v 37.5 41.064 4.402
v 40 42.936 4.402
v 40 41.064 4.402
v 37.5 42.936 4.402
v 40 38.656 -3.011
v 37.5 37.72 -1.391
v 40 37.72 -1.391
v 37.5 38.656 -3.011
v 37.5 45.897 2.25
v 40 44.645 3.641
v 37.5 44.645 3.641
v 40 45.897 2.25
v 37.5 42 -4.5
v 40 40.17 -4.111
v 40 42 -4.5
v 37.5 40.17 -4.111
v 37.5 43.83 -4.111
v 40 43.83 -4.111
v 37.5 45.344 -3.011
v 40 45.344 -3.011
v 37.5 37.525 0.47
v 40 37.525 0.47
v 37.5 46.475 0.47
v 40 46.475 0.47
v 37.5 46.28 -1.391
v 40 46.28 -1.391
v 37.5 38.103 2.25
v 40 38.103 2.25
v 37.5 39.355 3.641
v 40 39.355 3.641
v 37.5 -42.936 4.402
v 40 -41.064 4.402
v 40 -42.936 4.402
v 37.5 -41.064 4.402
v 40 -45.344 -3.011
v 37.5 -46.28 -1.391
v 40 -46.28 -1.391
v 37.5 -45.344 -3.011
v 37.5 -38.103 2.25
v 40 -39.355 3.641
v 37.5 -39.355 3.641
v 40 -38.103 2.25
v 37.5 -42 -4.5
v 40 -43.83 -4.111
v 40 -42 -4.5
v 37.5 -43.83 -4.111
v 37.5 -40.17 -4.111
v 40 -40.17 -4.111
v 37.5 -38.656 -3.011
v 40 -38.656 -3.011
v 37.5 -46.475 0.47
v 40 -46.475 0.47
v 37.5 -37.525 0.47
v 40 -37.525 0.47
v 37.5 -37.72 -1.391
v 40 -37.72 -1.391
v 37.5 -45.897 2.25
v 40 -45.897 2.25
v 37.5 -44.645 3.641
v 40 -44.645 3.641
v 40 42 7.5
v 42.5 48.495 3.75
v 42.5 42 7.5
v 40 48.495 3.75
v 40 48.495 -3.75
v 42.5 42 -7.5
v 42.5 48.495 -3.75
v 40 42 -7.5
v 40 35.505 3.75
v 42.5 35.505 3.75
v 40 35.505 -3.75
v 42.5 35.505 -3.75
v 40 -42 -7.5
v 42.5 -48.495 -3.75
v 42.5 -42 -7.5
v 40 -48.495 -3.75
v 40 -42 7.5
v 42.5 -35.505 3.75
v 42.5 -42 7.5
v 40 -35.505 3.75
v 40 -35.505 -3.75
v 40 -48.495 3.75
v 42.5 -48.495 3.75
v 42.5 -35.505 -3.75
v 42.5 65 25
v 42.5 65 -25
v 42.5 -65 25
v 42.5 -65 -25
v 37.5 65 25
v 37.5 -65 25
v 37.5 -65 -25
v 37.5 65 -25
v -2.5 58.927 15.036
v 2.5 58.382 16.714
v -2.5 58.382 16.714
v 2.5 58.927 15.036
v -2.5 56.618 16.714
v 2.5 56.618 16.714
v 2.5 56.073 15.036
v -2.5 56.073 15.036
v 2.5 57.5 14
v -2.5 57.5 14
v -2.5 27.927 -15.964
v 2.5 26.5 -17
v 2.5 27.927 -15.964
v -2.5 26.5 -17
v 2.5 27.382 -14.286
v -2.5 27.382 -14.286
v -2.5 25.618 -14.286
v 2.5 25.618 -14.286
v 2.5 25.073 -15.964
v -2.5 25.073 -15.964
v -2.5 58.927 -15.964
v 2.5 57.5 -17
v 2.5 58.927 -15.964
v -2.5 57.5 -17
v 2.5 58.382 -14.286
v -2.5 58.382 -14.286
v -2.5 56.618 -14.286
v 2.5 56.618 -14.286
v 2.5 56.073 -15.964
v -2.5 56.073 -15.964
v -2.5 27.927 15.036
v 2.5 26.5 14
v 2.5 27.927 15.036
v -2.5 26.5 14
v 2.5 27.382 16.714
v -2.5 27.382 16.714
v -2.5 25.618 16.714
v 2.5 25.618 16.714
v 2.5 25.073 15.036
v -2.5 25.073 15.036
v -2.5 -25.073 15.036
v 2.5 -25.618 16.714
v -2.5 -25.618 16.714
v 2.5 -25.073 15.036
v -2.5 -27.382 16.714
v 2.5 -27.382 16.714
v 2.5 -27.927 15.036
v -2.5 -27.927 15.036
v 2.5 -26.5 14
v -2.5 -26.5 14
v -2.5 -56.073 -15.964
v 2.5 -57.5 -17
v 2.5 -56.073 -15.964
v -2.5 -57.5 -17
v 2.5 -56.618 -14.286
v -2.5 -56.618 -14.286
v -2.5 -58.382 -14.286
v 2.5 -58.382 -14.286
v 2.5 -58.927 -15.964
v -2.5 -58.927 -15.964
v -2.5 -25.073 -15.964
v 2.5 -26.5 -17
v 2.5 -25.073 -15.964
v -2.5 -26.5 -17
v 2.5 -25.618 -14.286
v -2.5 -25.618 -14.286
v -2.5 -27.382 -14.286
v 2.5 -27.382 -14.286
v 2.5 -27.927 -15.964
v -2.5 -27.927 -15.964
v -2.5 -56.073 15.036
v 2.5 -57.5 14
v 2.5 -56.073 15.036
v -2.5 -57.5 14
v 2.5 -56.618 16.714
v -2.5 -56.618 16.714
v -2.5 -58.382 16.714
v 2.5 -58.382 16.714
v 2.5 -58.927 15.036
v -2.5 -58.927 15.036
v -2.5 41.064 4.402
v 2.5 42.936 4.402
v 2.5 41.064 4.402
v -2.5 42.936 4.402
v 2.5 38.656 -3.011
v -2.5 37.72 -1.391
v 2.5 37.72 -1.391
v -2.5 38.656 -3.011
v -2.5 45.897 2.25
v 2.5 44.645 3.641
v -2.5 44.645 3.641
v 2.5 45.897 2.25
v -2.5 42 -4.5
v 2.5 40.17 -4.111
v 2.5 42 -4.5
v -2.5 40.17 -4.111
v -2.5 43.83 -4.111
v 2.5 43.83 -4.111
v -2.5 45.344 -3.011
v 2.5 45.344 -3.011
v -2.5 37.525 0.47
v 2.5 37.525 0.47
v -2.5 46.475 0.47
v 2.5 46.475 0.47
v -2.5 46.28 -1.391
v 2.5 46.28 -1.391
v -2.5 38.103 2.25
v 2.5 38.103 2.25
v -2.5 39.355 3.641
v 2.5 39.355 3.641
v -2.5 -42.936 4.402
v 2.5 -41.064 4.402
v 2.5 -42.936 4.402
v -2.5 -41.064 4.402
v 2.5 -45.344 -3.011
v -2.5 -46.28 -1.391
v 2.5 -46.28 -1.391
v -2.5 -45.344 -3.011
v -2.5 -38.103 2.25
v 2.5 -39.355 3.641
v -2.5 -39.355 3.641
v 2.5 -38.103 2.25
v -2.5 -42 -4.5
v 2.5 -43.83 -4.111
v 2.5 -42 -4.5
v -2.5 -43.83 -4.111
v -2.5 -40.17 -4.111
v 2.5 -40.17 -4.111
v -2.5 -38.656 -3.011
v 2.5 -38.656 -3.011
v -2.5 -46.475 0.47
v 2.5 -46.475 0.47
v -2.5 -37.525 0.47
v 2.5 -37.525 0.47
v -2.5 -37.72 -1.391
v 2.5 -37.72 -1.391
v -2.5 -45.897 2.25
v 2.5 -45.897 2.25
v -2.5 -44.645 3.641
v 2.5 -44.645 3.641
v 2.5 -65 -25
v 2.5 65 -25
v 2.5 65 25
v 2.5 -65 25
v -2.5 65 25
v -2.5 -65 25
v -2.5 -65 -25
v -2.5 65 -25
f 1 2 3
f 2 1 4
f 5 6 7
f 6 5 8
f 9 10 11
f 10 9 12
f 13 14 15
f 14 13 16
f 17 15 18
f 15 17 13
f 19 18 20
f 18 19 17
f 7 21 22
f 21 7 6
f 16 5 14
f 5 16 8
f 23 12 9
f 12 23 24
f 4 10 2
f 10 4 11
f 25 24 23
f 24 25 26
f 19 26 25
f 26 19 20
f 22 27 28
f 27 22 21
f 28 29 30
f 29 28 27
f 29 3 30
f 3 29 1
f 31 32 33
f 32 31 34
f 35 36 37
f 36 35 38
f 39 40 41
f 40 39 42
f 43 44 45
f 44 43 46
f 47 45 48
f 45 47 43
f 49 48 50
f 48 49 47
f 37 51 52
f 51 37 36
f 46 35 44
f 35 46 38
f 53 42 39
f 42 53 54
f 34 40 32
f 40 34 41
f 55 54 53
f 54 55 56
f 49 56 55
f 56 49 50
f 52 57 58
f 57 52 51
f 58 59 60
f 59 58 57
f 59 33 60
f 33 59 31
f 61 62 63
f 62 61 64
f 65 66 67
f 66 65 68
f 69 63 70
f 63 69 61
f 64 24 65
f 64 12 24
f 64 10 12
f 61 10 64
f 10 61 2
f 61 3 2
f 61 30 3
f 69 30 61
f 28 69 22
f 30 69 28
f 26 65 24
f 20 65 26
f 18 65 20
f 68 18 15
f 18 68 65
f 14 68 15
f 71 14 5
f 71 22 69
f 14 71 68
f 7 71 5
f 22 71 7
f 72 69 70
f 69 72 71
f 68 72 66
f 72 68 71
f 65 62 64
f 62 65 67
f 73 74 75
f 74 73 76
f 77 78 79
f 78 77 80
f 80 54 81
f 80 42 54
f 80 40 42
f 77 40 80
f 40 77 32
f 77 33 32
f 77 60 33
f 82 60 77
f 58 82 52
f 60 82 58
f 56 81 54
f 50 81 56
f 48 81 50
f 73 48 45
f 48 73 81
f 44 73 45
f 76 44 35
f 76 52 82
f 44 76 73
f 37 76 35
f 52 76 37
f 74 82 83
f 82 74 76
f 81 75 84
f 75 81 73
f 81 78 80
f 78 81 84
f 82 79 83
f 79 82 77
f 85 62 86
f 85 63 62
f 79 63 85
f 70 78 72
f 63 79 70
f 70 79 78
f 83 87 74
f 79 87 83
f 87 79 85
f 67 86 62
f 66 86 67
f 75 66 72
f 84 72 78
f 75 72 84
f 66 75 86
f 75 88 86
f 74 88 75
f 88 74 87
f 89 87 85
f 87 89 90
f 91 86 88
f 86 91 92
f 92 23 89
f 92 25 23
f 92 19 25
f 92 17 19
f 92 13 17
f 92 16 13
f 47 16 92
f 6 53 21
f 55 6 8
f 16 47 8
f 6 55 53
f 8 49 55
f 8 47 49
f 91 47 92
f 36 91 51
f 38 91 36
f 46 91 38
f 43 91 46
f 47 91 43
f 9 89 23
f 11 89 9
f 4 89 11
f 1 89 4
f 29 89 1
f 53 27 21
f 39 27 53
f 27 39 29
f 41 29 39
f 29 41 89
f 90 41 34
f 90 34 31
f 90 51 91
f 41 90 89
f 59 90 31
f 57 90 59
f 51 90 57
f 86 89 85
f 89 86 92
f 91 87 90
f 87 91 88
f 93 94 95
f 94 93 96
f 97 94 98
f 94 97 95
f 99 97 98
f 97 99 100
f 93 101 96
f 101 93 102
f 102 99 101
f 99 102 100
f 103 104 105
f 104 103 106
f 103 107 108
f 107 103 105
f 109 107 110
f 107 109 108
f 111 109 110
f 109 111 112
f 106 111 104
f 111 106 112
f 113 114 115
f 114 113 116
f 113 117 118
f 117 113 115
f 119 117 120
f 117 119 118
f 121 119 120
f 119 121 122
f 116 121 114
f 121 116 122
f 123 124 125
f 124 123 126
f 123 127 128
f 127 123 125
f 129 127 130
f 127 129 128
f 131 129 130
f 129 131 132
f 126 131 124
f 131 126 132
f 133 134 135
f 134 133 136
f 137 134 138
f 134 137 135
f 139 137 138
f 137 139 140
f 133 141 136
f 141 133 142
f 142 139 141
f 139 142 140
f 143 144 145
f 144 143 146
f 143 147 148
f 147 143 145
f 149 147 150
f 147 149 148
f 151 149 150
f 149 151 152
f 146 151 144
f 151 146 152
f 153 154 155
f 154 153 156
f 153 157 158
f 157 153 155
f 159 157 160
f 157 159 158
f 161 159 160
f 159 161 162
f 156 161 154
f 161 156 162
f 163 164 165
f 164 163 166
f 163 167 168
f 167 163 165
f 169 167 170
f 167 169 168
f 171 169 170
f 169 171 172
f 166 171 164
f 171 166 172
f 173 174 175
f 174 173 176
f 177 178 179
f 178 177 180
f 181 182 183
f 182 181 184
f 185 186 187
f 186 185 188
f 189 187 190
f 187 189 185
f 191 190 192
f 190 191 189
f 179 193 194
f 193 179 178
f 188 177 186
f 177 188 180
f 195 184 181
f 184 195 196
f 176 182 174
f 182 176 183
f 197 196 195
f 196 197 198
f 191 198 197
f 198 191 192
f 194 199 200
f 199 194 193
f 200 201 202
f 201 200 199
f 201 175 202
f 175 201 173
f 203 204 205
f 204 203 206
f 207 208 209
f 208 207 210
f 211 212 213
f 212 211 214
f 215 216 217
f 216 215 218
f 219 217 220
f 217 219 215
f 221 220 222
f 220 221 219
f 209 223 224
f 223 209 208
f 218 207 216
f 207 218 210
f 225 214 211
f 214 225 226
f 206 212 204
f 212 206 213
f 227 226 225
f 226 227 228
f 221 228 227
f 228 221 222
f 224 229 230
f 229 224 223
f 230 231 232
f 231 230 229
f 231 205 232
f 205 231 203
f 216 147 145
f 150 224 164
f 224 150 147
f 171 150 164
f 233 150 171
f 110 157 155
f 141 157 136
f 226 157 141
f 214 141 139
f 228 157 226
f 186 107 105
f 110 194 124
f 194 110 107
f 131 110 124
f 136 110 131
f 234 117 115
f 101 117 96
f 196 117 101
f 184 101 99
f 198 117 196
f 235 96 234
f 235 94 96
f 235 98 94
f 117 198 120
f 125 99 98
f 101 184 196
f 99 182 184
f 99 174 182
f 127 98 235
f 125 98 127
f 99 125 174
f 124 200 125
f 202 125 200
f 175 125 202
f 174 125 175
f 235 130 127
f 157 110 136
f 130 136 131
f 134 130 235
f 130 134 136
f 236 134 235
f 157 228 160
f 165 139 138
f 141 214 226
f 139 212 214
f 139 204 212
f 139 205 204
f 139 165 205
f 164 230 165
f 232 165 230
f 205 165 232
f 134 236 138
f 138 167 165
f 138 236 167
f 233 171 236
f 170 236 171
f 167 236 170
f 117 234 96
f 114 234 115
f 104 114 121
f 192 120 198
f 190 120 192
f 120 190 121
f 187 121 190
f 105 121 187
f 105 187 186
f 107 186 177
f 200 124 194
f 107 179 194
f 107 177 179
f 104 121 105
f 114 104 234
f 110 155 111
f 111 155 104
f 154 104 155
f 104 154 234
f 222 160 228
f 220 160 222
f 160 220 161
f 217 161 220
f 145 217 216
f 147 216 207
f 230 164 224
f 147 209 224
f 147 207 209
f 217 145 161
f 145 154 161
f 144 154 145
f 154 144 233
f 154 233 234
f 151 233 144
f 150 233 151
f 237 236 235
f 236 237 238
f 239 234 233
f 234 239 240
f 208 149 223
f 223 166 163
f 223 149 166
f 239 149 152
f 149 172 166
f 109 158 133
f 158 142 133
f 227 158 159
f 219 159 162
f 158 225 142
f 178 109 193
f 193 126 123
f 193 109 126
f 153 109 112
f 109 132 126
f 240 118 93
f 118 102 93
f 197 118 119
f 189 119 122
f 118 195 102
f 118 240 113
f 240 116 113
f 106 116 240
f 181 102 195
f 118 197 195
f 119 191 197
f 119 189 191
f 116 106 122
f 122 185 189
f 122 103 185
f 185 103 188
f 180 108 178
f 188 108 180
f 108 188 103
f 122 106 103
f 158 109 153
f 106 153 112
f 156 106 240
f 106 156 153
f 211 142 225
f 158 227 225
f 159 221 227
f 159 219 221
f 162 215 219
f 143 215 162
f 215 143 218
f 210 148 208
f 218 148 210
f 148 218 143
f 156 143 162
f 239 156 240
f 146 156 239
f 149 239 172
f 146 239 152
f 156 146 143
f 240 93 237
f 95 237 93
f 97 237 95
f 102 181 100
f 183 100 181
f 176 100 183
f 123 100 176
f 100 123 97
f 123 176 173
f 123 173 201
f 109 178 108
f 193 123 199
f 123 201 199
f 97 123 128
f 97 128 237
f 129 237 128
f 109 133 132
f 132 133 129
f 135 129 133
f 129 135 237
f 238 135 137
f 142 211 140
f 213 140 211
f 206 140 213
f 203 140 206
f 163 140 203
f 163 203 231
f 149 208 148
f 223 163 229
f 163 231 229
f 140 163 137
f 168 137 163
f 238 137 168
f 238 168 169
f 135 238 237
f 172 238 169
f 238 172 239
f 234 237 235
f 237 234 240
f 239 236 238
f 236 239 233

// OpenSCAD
wall_thickness		= 5;
nut_size					= 15;
rod_diamiter			= 9;
screw_spacing		= 31;
motor_distance		= 84;
wall_width				= 130;
wall_height			= 50;
sides_on_nut			= 6;
screw_diamiter		= 3;


translate([40,0,0]) wall_one();
wall_two();

//color([0.75,0.75,0.75]) motor_dont_render();

module wall_one(){
	difference(){
		wall_one_added();
		wall_one_taken();
	}
}


module wall_one_added(){
		cube([wall_thickness,wall_width,wall_height],center=true);
}
	
module wall_one_taken(){
		rotate([0,90,0]) translate([0,motor_distance/2,-20]) cylinder(h=50, d=rod_diamiter, center=true);
		rotate([0,90,0]) translate([0,-motor_distance/2,-20]) cylinder(h=50, d=rod_diamiter, center=true);
		rotate([0,90,0]) translate([0,motor_distance/2,10/2]) cylinder(h=10, d=nut_size, center=true, $fn=sides_on_nut);
		rotate([0,90,0]) translate([0,-motor_distance/2,10/2]) cylinder(h=10, d=nut_size, center=true, $fn=sides_on_nut);
}

module wall_two(){
	difference(){
		wall_two_added();
		wall_two_taken();
	}
}


module wall_two_added(){
		cube([wall_thickness,wall_width,wall_height],center=true);
}
	
module wall_two_taken(){
		rotate([0,90,0]) translate([0,motor_distance/2,0]) cylinder(h=20, d=rod_diamiter, center=true);
		rotate([0,90,0]) translate([0,-motor_distance/2,0]) cylinder(h=20, d=rod_diamiter, center=true);
		translate([0,motor_distance/2,0]) motor();
		translate([0,-motor_distance/2,0]) motor();
}

module motor(){
	translate([0,screw_spacing/2,screw_spacing/2]) rotate([0,90,0]) cylinder(d=screw_diamiter, h=20, center=true);
	translate([0,-screw_spacing/2,-screw_spacing/2]) rotate([0,90,0]) cylinder(d=screw_diamiter, h=20, center=true);
	translate([0,screw_spacing/2,-screw_spacing/2]) rotate([0,90,0]) cylinder(d=screw_diamiter, h=20, center=true);
	translate([0,-screw_spacing/2,screw_spacing/2]) rotate([0,90,0]) cylinder(d=screw_diamiter, h=20, center=true);
}

module motor_dont_render(){
	translate([-40,motor_distance/2,0]) cube([42,42,42], center=true);
	translate([-40,-motor_distance/2,0]) cube([42,42,42], center=true);
	translate([-10,0,0]) wall_two_taken();
	translate([40,0,0]) wall_one_taken();
}
